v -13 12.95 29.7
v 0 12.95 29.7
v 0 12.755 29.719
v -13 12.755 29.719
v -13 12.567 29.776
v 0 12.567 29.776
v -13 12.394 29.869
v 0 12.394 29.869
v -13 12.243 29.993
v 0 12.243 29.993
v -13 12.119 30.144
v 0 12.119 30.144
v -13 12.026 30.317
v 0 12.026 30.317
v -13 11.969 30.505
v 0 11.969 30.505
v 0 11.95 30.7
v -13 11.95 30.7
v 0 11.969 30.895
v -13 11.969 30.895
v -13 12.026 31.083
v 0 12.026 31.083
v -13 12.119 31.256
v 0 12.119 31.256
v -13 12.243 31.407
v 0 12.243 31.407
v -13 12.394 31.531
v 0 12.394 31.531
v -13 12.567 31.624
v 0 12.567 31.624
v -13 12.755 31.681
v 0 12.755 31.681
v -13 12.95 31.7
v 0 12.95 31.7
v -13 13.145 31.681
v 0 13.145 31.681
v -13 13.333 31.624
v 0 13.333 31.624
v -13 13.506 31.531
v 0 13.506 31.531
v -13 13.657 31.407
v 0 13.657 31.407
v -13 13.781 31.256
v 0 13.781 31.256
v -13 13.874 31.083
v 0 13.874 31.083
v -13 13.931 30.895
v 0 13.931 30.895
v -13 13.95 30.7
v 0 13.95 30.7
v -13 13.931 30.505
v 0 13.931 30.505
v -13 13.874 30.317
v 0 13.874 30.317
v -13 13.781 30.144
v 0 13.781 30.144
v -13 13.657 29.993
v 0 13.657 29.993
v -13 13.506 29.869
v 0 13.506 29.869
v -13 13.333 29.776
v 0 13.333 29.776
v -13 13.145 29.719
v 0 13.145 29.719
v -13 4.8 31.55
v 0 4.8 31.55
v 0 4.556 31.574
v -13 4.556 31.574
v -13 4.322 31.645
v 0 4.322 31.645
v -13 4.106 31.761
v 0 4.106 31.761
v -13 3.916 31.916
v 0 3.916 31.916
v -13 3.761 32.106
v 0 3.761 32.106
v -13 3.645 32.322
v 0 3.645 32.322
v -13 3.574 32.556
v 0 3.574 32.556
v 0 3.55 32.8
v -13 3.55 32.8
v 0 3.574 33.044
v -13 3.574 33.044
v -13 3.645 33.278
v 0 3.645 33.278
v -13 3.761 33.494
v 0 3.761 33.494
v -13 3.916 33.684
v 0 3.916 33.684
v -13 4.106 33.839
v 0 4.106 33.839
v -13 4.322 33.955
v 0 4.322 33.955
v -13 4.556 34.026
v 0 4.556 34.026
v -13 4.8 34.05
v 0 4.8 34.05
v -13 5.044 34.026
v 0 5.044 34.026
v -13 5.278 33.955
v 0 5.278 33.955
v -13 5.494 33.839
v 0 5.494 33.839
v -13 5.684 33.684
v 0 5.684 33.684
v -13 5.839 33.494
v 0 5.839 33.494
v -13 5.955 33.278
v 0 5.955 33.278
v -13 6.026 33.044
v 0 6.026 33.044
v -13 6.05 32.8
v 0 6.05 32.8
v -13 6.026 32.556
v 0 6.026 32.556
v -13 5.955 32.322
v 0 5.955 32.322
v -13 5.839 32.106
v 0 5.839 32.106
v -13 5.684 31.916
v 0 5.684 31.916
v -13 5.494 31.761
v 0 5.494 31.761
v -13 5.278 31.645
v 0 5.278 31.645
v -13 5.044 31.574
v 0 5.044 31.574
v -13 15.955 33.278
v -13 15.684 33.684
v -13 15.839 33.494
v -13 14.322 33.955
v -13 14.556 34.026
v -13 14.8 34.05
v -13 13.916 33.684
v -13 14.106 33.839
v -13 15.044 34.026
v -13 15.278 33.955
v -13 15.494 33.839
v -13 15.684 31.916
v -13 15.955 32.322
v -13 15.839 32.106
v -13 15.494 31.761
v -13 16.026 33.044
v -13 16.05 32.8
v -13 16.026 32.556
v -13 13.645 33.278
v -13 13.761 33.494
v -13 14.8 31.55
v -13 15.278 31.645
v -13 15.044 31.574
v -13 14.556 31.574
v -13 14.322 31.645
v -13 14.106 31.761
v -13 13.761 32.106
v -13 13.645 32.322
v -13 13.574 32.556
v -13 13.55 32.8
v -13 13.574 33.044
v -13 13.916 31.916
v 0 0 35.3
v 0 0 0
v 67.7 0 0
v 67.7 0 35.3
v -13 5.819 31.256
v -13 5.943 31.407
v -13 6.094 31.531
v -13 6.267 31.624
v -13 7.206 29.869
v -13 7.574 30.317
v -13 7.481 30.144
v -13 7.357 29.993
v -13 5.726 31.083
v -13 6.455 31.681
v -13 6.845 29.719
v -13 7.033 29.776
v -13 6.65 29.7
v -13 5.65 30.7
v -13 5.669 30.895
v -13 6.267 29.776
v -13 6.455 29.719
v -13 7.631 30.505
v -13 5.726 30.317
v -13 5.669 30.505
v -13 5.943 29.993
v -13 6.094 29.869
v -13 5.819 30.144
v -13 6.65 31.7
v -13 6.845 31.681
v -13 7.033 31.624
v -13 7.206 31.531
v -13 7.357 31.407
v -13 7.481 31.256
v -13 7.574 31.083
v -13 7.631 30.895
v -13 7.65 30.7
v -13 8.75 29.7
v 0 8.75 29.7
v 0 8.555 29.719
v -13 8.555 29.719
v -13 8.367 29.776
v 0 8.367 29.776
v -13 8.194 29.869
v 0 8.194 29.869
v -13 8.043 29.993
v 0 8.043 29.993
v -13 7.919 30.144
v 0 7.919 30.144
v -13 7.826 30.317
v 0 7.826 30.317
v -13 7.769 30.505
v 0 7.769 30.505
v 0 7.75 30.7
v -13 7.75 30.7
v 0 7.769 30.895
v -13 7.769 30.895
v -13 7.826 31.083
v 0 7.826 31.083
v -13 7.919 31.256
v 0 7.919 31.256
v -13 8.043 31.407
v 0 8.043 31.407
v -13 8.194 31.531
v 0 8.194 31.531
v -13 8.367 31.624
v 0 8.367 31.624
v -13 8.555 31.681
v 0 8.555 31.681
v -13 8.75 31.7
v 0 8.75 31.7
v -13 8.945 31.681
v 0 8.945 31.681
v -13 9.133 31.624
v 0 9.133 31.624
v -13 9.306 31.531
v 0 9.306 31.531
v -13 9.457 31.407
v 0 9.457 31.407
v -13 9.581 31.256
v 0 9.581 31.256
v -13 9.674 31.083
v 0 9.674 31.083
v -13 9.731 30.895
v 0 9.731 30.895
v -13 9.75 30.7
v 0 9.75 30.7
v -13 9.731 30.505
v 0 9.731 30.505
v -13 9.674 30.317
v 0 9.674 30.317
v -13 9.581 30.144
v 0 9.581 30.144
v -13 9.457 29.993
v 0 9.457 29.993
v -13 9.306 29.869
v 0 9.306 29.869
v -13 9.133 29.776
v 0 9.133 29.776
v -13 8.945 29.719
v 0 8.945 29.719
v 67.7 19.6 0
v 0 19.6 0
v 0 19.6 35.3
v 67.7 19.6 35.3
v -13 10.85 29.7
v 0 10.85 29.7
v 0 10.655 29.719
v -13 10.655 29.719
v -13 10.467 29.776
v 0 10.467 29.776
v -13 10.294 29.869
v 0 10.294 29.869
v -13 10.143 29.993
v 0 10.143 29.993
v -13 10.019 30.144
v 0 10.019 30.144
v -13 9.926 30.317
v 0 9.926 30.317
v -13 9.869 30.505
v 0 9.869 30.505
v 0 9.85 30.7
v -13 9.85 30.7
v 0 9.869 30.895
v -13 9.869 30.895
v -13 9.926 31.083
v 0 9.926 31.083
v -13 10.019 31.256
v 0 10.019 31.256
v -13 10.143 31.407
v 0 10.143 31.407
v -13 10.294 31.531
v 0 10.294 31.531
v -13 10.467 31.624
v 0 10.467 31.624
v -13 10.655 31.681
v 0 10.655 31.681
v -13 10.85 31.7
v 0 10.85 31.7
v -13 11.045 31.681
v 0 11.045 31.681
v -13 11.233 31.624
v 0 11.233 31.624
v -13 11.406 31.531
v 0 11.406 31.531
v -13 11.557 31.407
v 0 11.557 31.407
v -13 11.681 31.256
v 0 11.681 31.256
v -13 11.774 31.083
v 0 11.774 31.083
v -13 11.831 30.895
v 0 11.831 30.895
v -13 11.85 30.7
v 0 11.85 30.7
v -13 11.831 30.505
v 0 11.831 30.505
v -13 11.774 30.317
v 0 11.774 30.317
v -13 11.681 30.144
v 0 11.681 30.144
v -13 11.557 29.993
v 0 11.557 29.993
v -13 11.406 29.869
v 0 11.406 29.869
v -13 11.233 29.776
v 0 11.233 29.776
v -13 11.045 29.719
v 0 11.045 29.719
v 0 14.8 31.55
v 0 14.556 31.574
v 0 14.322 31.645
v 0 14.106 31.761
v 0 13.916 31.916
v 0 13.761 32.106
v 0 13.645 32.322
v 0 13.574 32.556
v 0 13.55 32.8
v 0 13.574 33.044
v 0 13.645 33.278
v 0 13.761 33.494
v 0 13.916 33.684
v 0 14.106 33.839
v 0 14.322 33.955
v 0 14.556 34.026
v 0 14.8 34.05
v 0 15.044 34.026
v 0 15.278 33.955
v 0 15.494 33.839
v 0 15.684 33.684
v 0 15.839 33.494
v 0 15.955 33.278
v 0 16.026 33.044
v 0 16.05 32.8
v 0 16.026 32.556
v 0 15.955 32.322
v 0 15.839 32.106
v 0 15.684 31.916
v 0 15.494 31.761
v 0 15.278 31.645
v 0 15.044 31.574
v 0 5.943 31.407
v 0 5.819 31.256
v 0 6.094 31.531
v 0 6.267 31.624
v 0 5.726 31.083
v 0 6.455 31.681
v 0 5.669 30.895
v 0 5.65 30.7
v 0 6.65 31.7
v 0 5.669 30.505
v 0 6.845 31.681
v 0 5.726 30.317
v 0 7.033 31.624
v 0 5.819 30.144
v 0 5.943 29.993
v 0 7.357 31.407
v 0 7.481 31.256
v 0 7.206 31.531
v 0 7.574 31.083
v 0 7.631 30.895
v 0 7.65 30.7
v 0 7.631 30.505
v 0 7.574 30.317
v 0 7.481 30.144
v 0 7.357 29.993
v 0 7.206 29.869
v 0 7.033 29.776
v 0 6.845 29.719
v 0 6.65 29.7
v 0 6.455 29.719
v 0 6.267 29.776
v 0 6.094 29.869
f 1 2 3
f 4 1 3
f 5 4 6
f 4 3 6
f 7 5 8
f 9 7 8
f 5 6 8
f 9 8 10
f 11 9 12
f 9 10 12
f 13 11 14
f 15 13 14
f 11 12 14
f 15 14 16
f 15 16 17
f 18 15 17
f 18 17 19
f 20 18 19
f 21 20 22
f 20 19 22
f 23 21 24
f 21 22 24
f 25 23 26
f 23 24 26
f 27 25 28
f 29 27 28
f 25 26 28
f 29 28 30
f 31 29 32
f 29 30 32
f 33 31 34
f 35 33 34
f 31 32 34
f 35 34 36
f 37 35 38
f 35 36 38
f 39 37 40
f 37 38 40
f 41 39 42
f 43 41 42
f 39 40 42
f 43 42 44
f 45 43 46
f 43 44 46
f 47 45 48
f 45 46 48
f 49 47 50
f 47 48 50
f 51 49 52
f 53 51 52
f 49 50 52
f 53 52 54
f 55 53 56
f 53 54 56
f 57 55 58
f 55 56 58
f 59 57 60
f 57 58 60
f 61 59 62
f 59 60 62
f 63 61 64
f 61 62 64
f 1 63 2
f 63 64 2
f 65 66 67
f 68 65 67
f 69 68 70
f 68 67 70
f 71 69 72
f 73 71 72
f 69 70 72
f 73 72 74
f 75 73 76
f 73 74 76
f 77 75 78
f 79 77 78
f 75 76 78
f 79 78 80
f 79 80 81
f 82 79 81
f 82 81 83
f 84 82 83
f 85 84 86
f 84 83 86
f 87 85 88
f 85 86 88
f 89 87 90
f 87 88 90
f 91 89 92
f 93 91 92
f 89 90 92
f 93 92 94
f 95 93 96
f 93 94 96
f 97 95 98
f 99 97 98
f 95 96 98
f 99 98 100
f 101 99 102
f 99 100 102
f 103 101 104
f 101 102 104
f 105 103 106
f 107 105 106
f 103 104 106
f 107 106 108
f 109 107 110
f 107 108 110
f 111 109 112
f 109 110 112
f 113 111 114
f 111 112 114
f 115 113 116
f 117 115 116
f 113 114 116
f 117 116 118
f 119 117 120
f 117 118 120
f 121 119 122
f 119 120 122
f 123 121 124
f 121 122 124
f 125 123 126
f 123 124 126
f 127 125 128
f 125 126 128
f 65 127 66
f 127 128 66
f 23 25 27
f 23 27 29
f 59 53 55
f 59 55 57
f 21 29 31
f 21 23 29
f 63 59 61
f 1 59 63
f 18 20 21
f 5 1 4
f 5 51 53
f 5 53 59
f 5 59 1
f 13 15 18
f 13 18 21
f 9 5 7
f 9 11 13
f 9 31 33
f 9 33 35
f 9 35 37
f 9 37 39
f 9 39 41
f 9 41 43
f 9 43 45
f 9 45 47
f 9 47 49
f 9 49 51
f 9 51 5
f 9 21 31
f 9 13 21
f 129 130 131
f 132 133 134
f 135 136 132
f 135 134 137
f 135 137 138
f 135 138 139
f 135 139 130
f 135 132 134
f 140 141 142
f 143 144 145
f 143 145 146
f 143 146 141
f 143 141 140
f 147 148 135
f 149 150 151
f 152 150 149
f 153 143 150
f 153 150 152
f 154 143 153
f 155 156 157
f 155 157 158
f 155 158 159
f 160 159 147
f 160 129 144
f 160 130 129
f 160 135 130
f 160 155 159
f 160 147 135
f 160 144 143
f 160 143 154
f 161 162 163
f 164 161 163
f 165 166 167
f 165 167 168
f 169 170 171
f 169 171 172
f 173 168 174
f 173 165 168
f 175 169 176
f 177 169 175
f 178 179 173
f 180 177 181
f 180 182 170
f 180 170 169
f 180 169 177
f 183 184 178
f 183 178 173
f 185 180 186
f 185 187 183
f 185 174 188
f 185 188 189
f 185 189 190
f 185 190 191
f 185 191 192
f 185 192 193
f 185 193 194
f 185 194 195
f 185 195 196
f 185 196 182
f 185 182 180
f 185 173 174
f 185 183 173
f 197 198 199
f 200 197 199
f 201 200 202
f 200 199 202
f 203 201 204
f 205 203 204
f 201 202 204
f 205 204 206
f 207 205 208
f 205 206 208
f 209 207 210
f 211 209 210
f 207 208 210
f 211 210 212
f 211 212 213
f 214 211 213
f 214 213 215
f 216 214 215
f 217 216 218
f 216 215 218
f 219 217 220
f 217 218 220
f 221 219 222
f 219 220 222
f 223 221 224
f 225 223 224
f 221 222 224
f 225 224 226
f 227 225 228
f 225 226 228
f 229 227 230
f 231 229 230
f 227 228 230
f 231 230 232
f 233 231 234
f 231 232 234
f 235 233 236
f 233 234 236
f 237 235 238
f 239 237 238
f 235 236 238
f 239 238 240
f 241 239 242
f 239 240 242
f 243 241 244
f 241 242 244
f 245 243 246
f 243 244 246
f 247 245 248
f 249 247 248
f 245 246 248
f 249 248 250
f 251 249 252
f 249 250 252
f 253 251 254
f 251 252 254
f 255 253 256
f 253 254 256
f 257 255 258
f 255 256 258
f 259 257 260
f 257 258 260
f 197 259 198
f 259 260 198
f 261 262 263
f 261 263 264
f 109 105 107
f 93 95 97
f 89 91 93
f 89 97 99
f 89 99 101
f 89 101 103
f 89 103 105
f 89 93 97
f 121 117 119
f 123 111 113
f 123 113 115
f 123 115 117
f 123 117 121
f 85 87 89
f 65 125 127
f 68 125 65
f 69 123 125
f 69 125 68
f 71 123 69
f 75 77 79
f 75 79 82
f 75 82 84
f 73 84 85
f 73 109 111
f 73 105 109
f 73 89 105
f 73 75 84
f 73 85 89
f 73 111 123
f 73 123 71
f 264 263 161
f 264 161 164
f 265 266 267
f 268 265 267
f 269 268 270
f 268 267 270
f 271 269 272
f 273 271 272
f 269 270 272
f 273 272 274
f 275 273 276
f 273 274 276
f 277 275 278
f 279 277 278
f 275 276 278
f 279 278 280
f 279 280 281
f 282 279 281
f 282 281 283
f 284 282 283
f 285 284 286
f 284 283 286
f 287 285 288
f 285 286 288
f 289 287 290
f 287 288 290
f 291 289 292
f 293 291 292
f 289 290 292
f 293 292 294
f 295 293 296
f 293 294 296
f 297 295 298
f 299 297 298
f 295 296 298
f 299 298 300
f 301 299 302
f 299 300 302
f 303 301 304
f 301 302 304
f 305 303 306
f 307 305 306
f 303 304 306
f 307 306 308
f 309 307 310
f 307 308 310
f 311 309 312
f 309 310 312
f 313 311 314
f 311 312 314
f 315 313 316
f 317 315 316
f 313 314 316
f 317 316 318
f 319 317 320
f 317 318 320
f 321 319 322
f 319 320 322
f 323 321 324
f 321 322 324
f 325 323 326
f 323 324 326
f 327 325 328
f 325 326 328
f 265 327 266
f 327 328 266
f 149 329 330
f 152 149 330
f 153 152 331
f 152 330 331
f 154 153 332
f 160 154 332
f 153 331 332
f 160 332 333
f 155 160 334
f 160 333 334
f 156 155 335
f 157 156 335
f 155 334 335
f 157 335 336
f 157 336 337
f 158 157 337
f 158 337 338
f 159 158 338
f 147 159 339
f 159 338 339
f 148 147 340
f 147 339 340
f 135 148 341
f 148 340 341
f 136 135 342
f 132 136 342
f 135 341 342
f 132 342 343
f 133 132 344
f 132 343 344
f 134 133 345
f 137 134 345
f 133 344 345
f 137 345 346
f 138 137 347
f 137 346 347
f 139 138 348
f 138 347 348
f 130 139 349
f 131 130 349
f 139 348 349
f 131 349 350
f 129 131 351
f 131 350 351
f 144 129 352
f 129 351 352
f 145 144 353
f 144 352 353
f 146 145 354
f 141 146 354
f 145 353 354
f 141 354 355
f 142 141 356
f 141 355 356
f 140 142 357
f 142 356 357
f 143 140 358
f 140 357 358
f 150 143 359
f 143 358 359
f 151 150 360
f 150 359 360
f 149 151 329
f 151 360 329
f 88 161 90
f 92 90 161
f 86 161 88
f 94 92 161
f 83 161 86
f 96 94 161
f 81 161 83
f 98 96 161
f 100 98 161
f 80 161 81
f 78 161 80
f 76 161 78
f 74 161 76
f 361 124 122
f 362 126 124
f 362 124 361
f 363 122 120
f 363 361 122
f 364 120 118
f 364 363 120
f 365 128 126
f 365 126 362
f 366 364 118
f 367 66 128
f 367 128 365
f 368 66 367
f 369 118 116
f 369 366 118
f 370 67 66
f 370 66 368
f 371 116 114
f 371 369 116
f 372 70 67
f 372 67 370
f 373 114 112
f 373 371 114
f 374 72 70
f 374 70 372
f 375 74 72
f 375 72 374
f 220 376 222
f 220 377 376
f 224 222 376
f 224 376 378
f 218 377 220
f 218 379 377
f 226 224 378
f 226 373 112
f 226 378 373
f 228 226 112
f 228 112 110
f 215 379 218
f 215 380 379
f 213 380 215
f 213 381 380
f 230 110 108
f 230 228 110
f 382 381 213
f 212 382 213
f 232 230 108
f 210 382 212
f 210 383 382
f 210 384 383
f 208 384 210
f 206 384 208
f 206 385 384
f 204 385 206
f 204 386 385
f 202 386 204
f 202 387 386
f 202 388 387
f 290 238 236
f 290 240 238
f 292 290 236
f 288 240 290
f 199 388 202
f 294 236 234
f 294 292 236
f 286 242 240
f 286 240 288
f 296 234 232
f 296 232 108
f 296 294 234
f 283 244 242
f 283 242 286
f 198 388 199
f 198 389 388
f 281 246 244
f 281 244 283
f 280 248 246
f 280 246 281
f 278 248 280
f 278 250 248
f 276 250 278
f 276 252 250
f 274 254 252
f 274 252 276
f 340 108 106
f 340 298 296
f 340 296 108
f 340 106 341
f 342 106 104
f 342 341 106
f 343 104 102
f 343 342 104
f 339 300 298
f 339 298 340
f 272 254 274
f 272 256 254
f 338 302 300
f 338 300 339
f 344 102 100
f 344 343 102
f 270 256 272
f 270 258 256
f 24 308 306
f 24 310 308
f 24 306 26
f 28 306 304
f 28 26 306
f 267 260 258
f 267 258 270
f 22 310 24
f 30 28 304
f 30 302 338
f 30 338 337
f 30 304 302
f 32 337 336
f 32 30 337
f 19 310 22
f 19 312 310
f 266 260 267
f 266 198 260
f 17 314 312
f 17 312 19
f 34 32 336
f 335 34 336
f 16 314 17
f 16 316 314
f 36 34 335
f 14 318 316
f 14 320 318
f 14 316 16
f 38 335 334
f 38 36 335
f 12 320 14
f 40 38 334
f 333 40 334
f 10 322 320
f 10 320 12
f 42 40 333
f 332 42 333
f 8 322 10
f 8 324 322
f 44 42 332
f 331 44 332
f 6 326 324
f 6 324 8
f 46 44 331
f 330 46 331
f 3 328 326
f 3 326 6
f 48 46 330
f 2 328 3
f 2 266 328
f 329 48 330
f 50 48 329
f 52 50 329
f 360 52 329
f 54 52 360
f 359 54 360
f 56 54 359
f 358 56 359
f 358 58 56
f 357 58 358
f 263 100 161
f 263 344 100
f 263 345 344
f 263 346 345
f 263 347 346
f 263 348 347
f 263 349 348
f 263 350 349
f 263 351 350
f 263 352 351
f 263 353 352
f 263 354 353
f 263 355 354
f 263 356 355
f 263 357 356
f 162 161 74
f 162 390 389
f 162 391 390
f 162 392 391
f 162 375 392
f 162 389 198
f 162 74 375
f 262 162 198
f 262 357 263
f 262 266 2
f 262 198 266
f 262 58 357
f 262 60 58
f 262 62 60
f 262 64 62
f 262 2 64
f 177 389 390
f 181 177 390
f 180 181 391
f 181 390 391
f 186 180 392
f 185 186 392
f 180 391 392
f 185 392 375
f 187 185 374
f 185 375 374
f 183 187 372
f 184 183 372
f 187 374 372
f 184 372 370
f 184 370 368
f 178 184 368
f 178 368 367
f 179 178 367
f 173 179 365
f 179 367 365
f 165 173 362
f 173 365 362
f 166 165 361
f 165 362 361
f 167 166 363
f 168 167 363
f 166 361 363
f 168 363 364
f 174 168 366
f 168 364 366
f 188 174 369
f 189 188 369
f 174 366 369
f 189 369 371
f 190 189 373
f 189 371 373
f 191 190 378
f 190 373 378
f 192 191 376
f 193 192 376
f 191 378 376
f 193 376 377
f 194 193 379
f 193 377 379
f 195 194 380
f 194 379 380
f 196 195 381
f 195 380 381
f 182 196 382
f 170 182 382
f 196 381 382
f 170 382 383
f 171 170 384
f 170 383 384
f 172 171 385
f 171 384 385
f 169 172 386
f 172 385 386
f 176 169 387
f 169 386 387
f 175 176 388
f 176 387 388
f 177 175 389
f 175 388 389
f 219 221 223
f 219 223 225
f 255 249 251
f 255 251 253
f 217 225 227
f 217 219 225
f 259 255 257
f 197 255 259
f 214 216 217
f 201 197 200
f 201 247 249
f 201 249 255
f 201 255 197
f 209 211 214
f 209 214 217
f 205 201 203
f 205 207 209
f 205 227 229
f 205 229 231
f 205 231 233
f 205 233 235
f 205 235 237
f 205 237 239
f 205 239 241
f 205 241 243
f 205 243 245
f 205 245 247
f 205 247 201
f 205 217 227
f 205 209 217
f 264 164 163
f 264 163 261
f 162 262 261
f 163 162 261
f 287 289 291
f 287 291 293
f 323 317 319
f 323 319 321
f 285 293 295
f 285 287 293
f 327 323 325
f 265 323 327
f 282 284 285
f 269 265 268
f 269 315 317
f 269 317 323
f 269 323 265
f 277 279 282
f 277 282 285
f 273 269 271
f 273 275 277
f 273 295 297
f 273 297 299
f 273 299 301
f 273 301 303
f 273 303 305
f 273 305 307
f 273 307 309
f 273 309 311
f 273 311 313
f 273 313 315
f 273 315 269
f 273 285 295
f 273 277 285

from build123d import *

# Parameters (mm, degrees)
SKETCH1_W           = 67.7
SKETCH1_H           = 19.6
BOSS_EXTRUDE1_DEPTH = 35.3
SKETCH3_R           = 1
SKETCH3_R_2         = 1.25
BOSS_EXTRUDE2_DEPTH = 13


with BuildPart() as part:
    # Sketch1 → Boss-Extrude1 (new body)
    with BuildSketch(Plane.XY):
        with Locations((33.85, 9.8)):
            Rectangle(SKETCH1_W, SKETCH1_H)
    extrude(amount=BOSS_EXTRUDE1_DEPTH)

    # Sketch3 → Boss-Extrude2 (add)
    with BuildSketch(Plane.ZY):
        with Locations(Location((30.7, 12.95, 0), (0, 0, 180))):
            Circle(SKETCH3_R)
        with Locations(Location((30.7, 10.85, 0), (0, 0, 180))):
            Circle(SKETCH3_R)
        with Locations(Location((30.7, 8.75, 0), (0, 0, 180))):
            Circle(SKETCH3_R)
        with Locations(Location((32.8, 4.8, 0), (0, 0, 180))):
            Circle(SKETCH3_R_2)
        with Locations(Location((32.8, 14.8, 0), (0, 0, 180))):
            Circle(SKETCH3_R_2)
        with Locations(Location((30.7, 6.65, 0), (0, 0, 180))):
            Circle(SKETCH3_R)
    extrude(amount=BOSS_EXTRUDE2_DEPTH)


solid = part.part
